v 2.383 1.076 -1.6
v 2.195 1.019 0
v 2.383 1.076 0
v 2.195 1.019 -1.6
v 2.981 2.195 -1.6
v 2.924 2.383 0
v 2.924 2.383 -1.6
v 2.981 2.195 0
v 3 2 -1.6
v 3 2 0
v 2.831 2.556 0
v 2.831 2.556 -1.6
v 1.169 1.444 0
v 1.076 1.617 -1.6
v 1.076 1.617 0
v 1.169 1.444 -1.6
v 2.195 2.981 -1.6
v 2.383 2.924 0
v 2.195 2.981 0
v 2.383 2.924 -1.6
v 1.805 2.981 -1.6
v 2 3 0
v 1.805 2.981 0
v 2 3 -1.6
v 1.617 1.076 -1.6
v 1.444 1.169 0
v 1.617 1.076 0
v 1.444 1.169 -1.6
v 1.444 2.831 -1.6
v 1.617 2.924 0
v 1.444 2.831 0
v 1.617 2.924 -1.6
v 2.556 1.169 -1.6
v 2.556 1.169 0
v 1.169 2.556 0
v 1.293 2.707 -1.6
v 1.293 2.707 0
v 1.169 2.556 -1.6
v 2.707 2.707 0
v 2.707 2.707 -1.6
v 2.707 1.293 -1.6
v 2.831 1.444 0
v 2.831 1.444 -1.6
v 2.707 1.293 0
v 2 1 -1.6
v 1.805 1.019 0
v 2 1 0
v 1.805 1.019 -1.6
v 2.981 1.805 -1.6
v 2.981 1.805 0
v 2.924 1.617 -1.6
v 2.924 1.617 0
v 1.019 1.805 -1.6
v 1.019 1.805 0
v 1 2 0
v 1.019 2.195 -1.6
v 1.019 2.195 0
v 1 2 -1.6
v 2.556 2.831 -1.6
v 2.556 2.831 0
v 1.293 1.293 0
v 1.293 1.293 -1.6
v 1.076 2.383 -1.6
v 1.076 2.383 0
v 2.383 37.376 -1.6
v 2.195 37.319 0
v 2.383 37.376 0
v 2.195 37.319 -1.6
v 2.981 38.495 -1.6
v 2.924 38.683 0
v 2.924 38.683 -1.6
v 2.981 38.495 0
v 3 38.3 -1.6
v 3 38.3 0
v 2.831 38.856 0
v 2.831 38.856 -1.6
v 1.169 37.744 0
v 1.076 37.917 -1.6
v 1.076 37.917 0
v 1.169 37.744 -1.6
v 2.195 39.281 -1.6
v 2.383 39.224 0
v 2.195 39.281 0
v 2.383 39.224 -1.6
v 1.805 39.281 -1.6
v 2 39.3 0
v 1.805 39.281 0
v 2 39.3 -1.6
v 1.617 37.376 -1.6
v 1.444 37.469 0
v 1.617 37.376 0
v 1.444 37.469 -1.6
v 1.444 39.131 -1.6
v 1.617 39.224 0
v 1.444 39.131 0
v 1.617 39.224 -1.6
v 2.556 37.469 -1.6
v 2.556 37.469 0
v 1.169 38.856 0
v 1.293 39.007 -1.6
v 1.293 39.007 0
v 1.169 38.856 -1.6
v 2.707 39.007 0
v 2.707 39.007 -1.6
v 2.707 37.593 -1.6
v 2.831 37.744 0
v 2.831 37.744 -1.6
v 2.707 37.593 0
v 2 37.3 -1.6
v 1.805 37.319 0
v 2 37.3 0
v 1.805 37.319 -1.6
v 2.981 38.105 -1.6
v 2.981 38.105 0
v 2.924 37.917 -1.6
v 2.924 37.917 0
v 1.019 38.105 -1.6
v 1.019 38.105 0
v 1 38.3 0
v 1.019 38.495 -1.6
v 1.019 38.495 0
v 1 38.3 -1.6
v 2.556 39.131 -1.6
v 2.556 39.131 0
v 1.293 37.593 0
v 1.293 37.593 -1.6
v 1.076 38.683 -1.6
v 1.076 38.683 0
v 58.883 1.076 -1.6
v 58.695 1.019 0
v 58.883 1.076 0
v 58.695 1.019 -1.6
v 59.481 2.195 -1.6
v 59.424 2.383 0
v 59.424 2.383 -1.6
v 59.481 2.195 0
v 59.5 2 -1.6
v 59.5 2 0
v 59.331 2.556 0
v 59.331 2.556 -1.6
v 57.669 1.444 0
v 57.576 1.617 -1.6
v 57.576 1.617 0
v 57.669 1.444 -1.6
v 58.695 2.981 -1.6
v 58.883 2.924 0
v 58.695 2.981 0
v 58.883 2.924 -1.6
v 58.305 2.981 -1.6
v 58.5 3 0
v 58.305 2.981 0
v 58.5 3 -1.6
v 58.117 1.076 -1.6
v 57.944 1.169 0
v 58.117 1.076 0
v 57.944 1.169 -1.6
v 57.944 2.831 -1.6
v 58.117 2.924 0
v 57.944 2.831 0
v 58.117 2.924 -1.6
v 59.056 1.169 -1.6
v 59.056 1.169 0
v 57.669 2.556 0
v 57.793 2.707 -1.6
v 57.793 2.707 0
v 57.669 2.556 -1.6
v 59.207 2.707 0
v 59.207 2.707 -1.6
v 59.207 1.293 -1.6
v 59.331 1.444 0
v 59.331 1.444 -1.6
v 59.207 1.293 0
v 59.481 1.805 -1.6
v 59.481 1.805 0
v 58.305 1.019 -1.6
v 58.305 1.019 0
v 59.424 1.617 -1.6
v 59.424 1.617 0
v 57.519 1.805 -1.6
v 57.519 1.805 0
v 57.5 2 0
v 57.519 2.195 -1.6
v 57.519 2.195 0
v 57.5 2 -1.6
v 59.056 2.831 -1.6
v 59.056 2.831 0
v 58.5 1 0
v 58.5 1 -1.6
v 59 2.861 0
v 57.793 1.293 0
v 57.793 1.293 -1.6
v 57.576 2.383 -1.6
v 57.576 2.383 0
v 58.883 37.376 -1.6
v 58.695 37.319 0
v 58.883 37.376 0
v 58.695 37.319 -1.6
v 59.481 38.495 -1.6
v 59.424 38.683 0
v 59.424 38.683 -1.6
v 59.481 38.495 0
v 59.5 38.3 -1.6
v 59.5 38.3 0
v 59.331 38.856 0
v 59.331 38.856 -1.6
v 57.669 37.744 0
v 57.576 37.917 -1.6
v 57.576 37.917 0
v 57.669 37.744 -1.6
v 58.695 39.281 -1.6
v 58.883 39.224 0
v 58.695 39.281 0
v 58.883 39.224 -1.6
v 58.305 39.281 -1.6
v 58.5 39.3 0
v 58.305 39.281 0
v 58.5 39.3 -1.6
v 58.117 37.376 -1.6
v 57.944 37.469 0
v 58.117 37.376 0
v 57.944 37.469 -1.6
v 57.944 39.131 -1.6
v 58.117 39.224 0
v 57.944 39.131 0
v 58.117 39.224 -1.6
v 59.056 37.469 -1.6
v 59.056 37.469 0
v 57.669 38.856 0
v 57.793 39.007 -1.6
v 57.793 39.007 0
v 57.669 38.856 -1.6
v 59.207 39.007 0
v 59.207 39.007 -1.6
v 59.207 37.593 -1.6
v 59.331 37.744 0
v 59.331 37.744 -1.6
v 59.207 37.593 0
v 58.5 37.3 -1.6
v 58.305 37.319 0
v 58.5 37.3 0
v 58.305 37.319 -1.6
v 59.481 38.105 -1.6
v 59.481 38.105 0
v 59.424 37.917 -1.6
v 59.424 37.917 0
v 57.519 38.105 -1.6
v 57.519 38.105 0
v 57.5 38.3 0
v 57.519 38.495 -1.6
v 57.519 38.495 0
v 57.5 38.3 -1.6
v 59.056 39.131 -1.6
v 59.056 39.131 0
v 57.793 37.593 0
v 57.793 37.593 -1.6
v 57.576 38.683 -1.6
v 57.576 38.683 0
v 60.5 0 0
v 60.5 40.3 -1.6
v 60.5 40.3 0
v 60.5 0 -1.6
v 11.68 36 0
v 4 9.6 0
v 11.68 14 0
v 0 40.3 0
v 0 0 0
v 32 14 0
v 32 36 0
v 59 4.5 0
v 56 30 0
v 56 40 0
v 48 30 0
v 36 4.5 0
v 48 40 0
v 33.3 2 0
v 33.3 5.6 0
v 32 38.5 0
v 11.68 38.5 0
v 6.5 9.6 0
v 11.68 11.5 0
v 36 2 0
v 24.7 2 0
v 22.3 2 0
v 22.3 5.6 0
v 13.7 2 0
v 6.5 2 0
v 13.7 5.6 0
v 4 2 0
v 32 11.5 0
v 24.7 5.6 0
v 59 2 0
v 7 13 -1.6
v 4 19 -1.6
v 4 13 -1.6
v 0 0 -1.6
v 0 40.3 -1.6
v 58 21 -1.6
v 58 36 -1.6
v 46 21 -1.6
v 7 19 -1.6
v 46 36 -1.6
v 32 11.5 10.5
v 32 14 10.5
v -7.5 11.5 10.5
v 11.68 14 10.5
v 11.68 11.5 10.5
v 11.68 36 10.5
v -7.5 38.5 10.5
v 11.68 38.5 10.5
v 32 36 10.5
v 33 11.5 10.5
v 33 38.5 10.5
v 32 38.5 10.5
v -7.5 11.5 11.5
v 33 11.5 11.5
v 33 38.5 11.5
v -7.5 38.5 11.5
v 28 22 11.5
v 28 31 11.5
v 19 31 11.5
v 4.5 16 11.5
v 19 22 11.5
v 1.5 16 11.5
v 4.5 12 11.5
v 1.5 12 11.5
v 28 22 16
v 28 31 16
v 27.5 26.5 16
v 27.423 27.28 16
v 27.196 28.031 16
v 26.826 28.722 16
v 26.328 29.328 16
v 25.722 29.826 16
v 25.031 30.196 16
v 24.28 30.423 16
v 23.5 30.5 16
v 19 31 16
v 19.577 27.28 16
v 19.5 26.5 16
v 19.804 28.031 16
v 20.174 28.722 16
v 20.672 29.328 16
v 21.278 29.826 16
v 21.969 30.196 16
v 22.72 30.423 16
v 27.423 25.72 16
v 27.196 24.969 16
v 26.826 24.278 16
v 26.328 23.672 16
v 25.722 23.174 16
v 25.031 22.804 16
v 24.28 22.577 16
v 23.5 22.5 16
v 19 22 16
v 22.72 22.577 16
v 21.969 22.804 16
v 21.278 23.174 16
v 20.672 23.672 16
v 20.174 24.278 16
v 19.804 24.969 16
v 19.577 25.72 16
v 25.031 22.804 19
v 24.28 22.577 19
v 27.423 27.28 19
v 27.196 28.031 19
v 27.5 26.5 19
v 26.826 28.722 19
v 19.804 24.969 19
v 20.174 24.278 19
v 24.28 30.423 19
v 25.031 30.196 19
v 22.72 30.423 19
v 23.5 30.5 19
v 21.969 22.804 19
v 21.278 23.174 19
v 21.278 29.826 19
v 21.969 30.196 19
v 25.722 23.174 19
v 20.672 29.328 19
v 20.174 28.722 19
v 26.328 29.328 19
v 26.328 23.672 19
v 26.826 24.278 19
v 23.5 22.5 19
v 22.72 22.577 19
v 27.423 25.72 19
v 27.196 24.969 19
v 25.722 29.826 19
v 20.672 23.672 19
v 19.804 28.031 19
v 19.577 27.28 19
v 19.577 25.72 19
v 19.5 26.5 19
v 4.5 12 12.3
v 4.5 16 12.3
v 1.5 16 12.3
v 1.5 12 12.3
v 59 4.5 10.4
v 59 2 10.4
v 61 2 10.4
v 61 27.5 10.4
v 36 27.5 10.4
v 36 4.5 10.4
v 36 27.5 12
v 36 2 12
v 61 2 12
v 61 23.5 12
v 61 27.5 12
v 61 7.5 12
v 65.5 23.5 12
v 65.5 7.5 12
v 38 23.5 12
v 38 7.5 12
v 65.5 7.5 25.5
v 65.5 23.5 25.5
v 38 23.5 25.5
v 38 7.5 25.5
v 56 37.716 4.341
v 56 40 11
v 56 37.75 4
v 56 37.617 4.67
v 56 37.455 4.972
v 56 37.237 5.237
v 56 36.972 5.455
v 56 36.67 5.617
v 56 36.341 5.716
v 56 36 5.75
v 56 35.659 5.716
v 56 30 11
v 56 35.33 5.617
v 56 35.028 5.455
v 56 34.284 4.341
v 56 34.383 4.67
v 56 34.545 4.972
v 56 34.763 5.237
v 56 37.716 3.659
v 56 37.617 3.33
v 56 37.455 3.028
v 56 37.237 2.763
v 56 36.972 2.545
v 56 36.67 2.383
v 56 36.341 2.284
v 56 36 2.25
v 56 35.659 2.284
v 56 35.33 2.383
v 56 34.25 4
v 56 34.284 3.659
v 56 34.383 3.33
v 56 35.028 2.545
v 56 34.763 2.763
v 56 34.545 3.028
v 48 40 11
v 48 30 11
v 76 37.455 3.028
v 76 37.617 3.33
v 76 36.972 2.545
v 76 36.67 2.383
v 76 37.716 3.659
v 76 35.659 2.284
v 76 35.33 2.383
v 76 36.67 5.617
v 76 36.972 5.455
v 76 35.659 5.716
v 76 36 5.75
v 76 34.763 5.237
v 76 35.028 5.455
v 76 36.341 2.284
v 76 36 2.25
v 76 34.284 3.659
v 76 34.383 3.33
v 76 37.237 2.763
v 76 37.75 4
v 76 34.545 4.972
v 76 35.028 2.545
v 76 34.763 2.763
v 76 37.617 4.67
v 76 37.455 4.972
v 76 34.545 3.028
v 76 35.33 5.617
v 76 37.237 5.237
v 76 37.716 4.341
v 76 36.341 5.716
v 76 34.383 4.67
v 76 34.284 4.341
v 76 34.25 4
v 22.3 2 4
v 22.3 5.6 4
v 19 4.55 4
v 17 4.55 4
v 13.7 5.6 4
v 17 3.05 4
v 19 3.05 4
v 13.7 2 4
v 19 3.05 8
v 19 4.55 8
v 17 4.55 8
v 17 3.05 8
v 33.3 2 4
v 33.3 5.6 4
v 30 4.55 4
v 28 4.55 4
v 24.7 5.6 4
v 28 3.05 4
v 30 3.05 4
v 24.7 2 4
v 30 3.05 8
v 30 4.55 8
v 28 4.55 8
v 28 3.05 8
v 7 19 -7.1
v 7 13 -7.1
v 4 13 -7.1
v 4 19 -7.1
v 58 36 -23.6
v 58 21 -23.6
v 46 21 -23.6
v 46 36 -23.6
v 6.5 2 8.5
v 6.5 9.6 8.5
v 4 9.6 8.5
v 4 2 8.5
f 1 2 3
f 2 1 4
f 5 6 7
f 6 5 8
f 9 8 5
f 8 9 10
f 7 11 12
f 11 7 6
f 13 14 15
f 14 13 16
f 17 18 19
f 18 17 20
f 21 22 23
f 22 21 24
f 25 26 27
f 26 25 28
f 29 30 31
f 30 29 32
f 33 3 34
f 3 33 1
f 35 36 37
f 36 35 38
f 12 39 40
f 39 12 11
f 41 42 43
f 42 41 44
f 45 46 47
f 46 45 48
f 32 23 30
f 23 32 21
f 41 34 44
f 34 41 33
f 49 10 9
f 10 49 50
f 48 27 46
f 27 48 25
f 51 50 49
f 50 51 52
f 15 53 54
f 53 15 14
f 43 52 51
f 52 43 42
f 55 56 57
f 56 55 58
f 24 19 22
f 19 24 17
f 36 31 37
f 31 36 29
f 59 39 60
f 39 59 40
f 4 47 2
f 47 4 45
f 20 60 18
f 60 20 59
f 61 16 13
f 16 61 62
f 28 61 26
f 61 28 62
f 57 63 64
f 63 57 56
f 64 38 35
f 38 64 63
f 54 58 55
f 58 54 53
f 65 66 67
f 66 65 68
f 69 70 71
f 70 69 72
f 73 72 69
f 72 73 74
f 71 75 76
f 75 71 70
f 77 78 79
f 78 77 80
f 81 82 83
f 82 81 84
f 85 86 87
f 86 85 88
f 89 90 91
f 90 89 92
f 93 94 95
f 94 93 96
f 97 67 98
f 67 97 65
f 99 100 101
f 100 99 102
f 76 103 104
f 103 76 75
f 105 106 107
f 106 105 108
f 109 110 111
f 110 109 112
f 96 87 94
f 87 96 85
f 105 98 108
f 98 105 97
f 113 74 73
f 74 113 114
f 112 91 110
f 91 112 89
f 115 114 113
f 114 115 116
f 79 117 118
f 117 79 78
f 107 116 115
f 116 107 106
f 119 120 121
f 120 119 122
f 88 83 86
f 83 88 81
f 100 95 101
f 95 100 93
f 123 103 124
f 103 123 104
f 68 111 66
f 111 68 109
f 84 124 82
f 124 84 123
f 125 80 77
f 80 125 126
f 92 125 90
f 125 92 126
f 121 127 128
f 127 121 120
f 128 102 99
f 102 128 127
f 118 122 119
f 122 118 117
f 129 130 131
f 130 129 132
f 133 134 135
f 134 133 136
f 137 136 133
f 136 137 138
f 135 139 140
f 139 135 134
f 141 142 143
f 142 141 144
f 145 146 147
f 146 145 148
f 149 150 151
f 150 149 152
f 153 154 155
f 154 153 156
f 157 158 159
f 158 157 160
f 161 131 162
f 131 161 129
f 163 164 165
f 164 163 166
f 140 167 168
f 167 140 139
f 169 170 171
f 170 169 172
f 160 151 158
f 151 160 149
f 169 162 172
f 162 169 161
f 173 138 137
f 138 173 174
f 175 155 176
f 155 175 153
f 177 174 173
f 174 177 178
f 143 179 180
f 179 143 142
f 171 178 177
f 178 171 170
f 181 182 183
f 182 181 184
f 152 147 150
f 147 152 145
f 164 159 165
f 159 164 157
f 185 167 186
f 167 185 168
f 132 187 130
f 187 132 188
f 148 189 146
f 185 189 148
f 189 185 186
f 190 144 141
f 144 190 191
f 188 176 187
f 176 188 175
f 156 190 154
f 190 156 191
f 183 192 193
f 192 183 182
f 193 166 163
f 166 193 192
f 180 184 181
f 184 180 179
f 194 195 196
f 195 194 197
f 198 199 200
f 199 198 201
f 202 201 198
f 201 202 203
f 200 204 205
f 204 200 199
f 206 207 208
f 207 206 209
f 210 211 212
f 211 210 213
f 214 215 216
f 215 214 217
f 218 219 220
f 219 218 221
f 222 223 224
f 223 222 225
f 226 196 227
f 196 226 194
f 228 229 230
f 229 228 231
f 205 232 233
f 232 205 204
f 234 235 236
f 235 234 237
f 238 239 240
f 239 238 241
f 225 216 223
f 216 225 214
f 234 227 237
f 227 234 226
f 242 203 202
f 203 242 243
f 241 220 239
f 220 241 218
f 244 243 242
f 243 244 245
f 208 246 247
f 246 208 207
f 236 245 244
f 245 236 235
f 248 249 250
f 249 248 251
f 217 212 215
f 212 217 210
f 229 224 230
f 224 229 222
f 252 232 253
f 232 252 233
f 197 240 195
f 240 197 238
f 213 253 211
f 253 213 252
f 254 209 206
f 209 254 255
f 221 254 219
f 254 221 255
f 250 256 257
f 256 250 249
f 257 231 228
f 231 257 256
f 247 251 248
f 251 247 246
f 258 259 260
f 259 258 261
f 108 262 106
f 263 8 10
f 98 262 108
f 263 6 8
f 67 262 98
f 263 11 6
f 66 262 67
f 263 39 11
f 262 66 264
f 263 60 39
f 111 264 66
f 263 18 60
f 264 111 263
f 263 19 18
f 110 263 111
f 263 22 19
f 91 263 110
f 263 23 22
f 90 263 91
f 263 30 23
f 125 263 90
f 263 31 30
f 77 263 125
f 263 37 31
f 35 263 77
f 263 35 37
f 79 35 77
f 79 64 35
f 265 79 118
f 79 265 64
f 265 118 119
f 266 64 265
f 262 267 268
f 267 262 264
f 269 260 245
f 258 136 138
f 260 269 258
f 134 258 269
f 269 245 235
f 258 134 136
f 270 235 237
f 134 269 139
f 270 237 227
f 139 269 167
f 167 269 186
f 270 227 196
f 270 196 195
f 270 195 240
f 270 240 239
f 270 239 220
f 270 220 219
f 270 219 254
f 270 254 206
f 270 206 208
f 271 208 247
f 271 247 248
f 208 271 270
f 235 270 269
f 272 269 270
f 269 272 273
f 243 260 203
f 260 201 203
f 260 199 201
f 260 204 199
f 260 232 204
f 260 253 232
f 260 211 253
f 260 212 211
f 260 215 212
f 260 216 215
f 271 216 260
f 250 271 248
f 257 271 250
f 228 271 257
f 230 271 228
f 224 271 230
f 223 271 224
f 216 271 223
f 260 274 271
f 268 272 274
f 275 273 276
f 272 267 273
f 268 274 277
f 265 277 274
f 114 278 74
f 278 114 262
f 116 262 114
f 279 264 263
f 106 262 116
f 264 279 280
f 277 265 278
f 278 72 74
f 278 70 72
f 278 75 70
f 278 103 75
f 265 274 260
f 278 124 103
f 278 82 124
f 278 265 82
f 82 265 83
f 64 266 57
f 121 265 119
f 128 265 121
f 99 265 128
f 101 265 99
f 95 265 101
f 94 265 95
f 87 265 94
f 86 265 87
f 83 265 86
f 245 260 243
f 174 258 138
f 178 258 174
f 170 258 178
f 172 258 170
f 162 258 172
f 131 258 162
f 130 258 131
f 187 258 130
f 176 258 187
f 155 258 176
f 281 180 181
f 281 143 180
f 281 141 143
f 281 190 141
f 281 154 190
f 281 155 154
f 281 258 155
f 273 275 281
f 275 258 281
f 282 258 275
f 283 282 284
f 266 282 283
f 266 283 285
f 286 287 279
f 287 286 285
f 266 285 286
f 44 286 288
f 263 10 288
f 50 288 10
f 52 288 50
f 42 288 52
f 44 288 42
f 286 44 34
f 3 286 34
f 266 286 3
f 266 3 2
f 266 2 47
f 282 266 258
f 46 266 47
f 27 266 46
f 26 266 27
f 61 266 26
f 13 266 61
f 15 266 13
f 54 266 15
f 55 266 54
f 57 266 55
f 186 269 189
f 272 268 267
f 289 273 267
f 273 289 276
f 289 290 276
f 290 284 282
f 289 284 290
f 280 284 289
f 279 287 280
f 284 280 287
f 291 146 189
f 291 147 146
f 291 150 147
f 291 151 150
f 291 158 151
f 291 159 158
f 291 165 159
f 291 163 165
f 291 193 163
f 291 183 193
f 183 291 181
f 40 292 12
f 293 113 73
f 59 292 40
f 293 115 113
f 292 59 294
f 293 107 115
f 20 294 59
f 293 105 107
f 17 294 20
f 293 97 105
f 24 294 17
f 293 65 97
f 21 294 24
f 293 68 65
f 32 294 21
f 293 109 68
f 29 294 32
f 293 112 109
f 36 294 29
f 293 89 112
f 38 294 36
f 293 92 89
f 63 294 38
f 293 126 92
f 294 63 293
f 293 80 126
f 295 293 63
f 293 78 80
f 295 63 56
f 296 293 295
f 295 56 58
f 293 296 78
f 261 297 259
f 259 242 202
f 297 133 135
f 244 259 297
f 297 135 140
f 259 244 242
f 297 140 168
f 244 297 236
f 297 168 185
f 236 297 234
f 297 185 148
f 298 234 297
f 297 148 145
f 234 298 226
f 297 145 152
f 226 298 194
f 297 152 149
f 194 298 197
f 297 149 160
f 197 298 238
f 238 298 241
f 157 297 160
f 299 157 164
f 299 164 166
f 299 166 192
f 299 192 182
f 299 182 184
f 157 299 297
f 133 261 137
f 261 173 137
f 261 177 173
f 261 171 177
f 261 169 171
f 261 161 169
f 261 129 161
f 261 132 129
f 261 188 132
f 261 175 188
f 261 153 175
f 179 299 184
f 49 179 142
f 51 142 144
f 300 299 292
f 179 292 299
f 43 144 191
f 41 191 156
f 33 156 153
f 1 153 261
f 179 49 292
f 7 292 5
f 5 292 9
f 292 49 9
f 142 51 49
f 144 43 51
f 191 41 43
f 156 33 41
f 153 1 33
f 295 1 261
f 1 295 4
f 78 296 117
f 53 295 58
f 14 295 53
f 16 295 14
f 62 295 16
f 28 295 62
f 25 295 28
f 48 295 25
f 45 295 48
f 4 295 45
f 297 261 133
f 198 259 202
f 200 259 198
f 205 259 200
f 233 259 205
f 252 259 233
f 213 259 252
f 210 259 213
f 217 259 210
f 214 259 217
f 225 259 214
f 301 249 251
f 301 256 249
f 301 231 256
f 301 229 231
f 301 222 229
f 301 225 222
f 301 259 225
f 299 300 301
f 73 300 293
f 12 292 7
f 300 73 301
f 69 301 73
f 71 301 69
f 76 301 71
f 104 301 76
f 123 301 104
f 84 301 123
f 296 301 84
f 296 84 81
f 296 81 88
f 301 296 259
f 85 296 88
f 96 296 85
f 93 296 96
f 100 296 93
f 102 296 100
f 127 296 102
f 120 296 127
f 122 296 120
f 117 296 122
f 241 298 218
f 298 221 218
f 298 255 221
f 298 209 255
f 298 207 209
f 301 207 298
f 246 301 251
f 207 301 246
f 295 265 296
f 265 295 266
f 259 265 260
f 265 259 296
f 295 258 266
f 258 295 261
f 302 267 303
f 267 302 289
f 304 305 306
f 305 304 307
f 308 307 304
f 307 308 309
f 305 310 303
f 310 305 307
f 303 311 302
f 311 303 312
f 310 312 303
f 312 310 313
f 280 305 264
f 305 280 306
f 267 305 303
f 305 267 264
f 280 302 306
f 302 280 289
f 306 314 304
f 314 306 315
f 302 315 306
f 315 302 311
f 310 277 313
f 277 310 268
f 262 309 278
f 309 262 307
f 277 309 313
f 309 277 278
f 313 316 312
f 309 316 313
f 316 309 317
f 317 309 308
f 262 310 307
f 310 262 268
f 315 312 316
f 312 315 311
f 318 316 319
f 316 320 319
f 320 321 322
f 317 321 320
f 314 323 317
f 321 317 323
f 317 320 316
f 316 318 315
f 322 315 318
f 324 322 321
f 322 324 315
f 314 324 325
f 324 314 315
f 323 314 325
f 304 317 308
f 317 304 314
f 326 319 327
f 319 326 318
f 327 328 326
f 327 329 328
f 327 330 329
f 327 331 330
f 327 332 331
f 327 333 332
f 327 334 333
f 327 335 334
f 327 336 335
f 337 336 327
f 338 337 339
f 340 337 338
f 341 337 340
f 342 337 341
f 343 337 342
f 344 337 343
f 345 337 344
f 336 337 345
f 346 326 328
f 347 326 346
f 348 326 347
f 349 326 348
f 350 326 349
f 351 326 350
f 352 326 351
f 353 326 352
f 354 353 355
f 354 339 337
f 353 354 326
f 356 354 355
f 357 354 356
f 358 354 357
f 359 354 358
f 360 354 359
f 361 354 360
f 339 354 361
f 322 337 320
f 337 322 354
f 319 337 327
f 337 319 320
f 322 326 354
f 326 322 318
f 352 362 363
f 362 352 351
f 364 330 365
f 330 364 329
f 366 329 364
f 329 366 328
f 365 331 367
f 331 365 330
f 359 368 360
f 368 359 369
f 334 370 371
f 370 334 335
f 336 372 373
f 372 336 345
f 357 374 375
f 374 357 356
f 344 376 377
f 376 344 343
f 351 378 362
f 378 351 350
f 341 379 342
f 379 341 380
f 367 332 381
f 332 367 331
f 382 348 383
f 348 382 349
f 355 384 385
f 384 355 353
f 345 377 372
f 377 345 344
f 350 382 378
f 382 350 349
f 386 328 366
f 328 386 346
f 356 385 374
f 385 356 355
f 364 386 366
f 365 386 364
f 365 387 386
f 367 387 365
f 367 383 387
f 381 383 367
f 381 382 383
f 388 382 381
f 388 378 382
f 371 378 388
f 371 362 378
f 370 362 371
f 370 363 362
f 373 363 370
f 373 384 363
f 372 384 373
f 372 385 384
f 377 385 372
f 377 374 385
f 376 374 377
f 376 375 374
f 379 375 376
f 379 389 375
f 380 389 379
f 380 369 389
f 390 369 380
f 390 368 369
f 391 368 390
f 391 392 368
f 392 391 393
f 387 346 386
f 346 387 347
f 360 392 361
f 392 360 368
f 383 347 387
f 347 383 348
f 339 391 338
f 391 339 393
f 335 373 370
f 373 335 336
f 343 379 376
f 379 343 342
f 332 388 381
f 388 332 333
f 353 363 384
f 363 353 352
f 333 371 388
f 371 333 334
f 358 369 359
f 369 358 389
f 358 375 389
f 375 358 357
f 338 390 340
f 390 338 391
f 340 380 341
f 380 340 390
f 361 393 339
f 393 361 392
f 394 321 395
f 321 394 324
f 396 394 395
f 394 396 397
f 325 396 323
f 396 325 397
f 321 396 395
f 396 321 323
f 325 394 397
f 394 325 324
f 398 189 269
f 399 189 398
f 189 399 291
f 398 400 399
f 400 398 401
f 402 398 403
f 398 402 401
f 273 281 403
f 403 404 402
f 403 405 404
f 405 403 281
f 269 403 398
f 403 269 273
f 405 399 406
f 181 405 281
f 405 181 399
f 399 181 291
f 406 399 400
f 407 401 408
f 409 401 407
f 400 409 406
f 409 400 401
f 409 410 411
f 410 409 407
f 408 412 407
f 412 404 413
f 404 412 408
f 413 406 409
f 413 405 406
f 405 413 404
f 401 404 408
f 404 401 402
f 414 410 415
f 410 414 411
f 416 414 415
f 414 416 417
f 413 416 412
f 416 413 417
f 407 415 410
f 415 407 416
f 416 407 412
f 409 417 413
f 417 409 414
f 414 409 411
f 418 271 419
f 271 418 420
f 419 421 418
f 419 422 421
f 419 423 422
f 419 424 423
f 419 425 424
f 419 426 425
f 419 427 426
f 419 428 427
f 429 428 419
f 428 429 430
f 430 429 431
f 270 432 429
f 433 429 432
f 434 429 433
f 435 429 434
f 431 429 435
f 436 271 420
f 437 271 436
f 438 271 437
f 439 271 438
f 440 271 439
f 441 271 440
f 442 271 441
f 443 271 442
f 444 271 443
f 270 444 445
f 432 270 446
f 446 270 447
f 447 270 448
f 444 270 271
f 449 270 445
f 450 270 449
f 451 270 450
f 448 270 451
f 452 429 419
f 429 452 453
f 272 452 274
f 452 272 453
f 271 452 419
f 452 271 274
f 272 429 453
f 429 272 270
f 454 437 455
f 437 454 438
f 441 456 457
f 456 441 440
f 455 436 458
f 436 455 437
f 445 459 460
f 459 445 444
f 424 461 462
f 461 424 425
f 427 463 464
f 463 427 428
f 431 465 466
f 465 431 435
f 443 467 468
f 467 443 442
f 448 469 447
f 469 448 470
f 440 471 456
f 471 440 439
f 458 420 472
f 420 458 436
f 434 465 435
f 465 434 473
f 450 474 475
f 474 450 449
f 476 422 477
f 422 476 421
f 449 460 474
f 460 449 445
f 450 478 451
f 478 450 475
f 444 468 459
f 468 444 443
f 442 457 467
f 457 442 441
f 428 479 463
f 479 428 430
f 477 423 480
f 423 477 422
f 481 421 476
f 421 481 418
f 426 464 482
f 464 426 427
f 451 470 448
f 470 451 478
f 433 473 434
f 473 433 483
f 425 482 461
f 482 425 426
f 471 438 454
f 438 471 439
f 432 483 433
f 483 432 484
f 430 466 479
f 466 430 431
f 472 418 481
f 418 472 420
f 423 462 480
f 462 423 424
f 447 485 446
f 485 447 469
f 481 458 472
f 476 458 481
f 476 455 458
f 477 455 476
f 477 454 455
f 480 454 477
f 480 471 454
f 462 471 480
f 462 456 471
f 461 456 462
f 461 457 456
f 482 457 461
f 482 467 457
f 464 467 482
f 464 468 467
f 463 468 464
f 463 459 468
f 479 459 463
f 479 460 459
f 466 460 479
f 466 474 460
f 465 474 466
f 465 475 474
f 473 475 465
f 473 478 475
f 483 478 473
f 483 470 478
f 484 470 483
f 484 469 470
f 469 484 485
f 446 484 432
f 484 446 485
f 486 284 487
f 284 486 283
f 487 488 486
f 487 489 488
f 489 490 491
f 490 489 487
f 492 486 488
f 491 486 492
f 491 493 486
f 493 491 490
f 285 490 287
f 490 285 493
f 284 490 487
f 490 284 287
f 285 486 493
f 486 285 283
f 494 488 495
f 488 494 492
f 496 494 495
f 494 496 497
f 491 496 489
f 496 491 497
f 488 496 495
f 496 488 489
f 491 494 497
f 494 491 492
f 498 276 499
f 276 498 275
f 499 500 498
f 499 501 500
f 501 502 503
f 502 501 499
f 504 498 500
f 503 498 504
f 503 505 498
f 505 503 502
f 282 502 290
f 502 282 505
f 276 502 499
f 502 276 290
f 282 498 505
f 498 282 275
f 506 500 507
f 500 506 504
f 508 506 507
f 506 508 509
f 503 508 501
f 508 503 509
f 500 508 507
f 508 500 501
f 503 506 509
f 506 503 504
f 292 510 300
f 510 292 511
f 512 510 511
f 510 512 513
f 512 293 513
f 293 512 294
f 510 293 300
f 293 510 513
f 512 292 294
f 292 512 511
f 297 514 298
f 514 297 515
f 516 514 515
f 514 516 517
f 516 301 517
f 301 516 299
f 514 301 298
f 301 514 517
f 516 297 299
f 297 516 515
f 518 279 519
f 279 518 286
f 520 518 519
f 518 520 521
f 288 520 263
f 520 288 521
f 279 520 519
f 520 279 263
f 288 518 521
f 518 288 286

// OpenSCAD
// eth-camera board assembly: perfboard + ESP32-CAM + W5500 + parts.
// Reference model used to size the chassis. Not printed.
//
// Units: mm. Datum: corner of the perfboard front face where the short
// (antenna) edge meets the long (switch) edge.
//   X along the 60.5 mm edge, towards the RJ45.
//   Y along the 40.3 mm edge, towards the screw terminal.
//   Z = 0 on the perfboard front face, + towards the lens.
// Back-side heights were measured from the perfboard back face.
//
// Values marked "est" come from photos, not calipers.

// --- Perfboard -------------------------------------------------------------
pb_x     = 60.5;  // perfboard length
pb_y     = 40.3;  // perfboard width
pb_t     = 1.6;   // perfboard thickness (est, standard FR4)
pb_hole_d   = 2.0;   // corner mounting hole diameter, M2
pb_hole_off = 2.0;   // hole centre to both edges (1 mm rim + radius)
wire_wrap   = 1.0;   // wires wrapped round the long edges stick out by this (est)

// --- ESP32-CAM (AI-Thinker, 27 x 40.5) ------------------------------------
esp_x0   = -7.5;  // antenna end overhangs the short edge
esp_len  = 40.5;
esp_wid  = 27;
esp_y0   = 11.5;  // est
esp_pcb_t   = 1.0;   // est
esp_pcb_top = 11.5;  // top face of the ESP32-CAM PCB
esp_hdr_w   = 2.5;   // female header strip width
esp_hdr_len = 8 * 2.54;  // 8-pin rows at the end away from the antenna
esp_hdr_end = 1;         // row end to the ESP32-CAM short edge (est)

lens_x   = 23.5;  // lens centre (est from "end of lens" 27.5 minus half barrel)
lens_y   = 26.5;  // lens centre (est from 30.5 minus half barrel)
lens_d   = 8;     // lens barrel outer diameter (est)
lens_top = 19;    // lens front face
cam_blk  = 9;     // camera holder square side (est)

led_x0 = 1.5; led_x1 = 4.5;  // flash LED footprint
led_y0 = 12;  led_y1 = 16;   // est
led_h  = 0.8;                // LED height above ESP PCB (est)

// --- W5500 module + RJ45 ---------------------------------------------------
w55_x0 = 36;   w55_x1 = 61;    // module PCB (est)
w55_y0 = 2;    w55_y1 = 27.5;  // est
w55_pcb_t = 1.6;               // est
rj_x0  = 38;   rj_x1  = 65.5;  // RJ45 body; mouth faces +X, 5 mm past the edge
rj_y0  = 7.5;  rj_y1  = 23.5;
rj_z0  = 12;   rj_z1  = 25.5;

// --- Screw terminal + power cable -----------------------------------------
term_x0 = 48;  term_x1 = 56;   // est
term_y0 = 30;  term_y1 = 40;
term_h  = 11;
cable_d = 3.5;
cable_y = 36;   // cable leaves the terminal towards +X (est)
cable_z = 4;    // wire entry height (est)

// --- Slide switches (SS-12D00), lever slides along X -----------------------
sw_x   = [18, 29];  // centres (est)
sw_y0  = 2;   sw_y1 = 5.6;
sw_len = 8.6;
sw_body_h  = 4;   // est
sw_lever_h = 8;   // lever top
sw_lever   = [2, 1.5];  // lever footprint X,Y (est)

// --- Serial header (3-pin female, plug from +Z) ----------------------------
ser_x0 = 4;   ser_x1 = 6.5;   // est
ser_y0 = 2;   ser_y1 = 9.6;   // est
ser_h  = 8.5;

// --- Back side (Z < -pb_t) -------------------------------------------------
rst_x0 = 4;   rst_x1 = 7;     // reset button (est)
rst_y0 = 13;  rst_y1 = 19;    // est
rst_h  = 5.5;                 // from back face
wires_h = 7;                  // max wire/solder height from back face
cap_x0 = 46;  cap_x1 = 58;    // 470 uF, tilted: envelope (est)
cap_y0 = 21;  cap_y1 = 36;    // est
cap_h  = 22;                  // from back face

// --- Derived envelope ------------------------------------------------------
env_x0 = esp_x0;
env_x1 = rj_x1;
env_y0 = -wire_wrap;
env_y1 = pb_y + wire_wrap;
env_z0 = -pb_t - cap_h;
env_z1 = rj_z1;

assert(esp_x0 + esp_len < w55_x0 + 0.5, "ESP32-CAM overlaps the W5500 module");
assert(lens_top > esp_pcb_top, "lens must sit above the ESP32-CAM PCB");
echo(envelope_x = [env_x0, env_x1], envelope_y = [env_y0, env_y1],
     envelope_z = [env_z0, env_z1]);

module blk(x0, x1, y0, y1, z0, z1) {
    translate([x0, y0, z0]) cube([x1 - x0, y1 - y0, z1 - z0]);
}

module perfboard() {
    color("green")
        difference() {
            blk(0, pb_x, 0, pb_y, -pb_t, 0);
            for (x = [pb_hole_off, pb_x - pb_hole_off],
                 y = [pb_hole_off, pb_y - pb_hole_off])
                translate([x, y, -pb_t - 1]) cylinder(d = pb_hole_d, h = pb_t + 2);
        }
}

module esp32cam() {
    x1 = esp_x0 + esp_len;
    y1 = esp_y0 + esp_wid;
    z0 = esp_pcb_top - esp_pcb_t;
    color("dimgray") {
        // female headers
        hx1 = x1 - esp_hdr_end;
        hx0 = hx1 - esp_hdr_len;
        blk(hx0, hx1, esp_y0, esp_y0 + esp_hdr_w, 0, z0);
        blk(hx0, hx1, y1 - esp_hdr_w, y1, 0, z0);
    }
    color("black") blk(esp_x0, x1, esp_y0, y1, z0, esp_pcb_top);
    color("silver")
        translate([lens_x - cam_blk / 2, lens_y - cam_blk / 2, esp_pcb_top])
            cube([cam_blk, cam_blk, lens_top - esp_pcb_top - 3]);
    color("black")
        translate([lens_x, lens_y, esp_pcb_top]) cylinder(d = lens_d, h = lens_top - esp_pcb_top);
    color("white") blk(led_x0, led_x1, led_y0, led_y1, esp_pcb_top, esp_pcb_top + led_h);
}

module w5500() {
    color("yellow") blk(w55_x0, w55_x1 - 2, w55_y0, w55_y0 + 2.5, 0, rj_z0 - w55_pcb_t);
    color("green") blk(w55_x0, w55_x1, w55_y0, w55_y1, rj_z0 - w55_pcb_t, rj_z0);
    color("silver") blk(rj_x0, rj_x1, rj_y0, rj_y1, rj_z0, rj_z1);
}

module terminal() {
    color("royalblue") blk(term_x0, term_x1, term_y0, term_y1, 0, term_h);
    color("gray")
        translate([term_x1, cable_y, cable_z]) rotate([0, 90, 0])
            cylinder(d = cable_d, h = 20);
}

module switches() {
    for (cx = sw_x) {
        color("ivory") blk(cx - sw_len / 2, cx + sw_len / 2, sw_y0, sw_y1, 0, sw_body_h);
        color("black")
            translate([cx - sw_lever[0] / 2, (sw_y0 + sw_y1 - sw_lever[1]) / 2, sw_body_h])
                cube([sw_lever[0], sw_lever[1], sw_lever_h - sw_body_h]);
    }
}

module serial_header() {
    color("black") blk(ser_x0, ser_x1, ser_y0, ser_y1, 0, ser_h);
}

module back_side() {
    zb = -pb_t;
    // wires and solder: ghost slab, the real stuff is somewhere inside it
    %blk(0, pb_x, 0, pb_y, zb - wires_h, zb);
    color("white") blk(rst_x0, rst_x1, rst_y0, rst_y1, zb - rst_h, zb);
    color("black") blk(cap_x0, cap_x1, cap_y0, cap_y1, zb - cap_h, zb);
}

module board() {
    perfboard();
    esp32cam();
    w5500();
    terminal();
    switches();
    serial_header();
    back_side();
}

// Files that include this one set board_included = true.

$fn = 32;
if (is_undef(board_included)) board();
